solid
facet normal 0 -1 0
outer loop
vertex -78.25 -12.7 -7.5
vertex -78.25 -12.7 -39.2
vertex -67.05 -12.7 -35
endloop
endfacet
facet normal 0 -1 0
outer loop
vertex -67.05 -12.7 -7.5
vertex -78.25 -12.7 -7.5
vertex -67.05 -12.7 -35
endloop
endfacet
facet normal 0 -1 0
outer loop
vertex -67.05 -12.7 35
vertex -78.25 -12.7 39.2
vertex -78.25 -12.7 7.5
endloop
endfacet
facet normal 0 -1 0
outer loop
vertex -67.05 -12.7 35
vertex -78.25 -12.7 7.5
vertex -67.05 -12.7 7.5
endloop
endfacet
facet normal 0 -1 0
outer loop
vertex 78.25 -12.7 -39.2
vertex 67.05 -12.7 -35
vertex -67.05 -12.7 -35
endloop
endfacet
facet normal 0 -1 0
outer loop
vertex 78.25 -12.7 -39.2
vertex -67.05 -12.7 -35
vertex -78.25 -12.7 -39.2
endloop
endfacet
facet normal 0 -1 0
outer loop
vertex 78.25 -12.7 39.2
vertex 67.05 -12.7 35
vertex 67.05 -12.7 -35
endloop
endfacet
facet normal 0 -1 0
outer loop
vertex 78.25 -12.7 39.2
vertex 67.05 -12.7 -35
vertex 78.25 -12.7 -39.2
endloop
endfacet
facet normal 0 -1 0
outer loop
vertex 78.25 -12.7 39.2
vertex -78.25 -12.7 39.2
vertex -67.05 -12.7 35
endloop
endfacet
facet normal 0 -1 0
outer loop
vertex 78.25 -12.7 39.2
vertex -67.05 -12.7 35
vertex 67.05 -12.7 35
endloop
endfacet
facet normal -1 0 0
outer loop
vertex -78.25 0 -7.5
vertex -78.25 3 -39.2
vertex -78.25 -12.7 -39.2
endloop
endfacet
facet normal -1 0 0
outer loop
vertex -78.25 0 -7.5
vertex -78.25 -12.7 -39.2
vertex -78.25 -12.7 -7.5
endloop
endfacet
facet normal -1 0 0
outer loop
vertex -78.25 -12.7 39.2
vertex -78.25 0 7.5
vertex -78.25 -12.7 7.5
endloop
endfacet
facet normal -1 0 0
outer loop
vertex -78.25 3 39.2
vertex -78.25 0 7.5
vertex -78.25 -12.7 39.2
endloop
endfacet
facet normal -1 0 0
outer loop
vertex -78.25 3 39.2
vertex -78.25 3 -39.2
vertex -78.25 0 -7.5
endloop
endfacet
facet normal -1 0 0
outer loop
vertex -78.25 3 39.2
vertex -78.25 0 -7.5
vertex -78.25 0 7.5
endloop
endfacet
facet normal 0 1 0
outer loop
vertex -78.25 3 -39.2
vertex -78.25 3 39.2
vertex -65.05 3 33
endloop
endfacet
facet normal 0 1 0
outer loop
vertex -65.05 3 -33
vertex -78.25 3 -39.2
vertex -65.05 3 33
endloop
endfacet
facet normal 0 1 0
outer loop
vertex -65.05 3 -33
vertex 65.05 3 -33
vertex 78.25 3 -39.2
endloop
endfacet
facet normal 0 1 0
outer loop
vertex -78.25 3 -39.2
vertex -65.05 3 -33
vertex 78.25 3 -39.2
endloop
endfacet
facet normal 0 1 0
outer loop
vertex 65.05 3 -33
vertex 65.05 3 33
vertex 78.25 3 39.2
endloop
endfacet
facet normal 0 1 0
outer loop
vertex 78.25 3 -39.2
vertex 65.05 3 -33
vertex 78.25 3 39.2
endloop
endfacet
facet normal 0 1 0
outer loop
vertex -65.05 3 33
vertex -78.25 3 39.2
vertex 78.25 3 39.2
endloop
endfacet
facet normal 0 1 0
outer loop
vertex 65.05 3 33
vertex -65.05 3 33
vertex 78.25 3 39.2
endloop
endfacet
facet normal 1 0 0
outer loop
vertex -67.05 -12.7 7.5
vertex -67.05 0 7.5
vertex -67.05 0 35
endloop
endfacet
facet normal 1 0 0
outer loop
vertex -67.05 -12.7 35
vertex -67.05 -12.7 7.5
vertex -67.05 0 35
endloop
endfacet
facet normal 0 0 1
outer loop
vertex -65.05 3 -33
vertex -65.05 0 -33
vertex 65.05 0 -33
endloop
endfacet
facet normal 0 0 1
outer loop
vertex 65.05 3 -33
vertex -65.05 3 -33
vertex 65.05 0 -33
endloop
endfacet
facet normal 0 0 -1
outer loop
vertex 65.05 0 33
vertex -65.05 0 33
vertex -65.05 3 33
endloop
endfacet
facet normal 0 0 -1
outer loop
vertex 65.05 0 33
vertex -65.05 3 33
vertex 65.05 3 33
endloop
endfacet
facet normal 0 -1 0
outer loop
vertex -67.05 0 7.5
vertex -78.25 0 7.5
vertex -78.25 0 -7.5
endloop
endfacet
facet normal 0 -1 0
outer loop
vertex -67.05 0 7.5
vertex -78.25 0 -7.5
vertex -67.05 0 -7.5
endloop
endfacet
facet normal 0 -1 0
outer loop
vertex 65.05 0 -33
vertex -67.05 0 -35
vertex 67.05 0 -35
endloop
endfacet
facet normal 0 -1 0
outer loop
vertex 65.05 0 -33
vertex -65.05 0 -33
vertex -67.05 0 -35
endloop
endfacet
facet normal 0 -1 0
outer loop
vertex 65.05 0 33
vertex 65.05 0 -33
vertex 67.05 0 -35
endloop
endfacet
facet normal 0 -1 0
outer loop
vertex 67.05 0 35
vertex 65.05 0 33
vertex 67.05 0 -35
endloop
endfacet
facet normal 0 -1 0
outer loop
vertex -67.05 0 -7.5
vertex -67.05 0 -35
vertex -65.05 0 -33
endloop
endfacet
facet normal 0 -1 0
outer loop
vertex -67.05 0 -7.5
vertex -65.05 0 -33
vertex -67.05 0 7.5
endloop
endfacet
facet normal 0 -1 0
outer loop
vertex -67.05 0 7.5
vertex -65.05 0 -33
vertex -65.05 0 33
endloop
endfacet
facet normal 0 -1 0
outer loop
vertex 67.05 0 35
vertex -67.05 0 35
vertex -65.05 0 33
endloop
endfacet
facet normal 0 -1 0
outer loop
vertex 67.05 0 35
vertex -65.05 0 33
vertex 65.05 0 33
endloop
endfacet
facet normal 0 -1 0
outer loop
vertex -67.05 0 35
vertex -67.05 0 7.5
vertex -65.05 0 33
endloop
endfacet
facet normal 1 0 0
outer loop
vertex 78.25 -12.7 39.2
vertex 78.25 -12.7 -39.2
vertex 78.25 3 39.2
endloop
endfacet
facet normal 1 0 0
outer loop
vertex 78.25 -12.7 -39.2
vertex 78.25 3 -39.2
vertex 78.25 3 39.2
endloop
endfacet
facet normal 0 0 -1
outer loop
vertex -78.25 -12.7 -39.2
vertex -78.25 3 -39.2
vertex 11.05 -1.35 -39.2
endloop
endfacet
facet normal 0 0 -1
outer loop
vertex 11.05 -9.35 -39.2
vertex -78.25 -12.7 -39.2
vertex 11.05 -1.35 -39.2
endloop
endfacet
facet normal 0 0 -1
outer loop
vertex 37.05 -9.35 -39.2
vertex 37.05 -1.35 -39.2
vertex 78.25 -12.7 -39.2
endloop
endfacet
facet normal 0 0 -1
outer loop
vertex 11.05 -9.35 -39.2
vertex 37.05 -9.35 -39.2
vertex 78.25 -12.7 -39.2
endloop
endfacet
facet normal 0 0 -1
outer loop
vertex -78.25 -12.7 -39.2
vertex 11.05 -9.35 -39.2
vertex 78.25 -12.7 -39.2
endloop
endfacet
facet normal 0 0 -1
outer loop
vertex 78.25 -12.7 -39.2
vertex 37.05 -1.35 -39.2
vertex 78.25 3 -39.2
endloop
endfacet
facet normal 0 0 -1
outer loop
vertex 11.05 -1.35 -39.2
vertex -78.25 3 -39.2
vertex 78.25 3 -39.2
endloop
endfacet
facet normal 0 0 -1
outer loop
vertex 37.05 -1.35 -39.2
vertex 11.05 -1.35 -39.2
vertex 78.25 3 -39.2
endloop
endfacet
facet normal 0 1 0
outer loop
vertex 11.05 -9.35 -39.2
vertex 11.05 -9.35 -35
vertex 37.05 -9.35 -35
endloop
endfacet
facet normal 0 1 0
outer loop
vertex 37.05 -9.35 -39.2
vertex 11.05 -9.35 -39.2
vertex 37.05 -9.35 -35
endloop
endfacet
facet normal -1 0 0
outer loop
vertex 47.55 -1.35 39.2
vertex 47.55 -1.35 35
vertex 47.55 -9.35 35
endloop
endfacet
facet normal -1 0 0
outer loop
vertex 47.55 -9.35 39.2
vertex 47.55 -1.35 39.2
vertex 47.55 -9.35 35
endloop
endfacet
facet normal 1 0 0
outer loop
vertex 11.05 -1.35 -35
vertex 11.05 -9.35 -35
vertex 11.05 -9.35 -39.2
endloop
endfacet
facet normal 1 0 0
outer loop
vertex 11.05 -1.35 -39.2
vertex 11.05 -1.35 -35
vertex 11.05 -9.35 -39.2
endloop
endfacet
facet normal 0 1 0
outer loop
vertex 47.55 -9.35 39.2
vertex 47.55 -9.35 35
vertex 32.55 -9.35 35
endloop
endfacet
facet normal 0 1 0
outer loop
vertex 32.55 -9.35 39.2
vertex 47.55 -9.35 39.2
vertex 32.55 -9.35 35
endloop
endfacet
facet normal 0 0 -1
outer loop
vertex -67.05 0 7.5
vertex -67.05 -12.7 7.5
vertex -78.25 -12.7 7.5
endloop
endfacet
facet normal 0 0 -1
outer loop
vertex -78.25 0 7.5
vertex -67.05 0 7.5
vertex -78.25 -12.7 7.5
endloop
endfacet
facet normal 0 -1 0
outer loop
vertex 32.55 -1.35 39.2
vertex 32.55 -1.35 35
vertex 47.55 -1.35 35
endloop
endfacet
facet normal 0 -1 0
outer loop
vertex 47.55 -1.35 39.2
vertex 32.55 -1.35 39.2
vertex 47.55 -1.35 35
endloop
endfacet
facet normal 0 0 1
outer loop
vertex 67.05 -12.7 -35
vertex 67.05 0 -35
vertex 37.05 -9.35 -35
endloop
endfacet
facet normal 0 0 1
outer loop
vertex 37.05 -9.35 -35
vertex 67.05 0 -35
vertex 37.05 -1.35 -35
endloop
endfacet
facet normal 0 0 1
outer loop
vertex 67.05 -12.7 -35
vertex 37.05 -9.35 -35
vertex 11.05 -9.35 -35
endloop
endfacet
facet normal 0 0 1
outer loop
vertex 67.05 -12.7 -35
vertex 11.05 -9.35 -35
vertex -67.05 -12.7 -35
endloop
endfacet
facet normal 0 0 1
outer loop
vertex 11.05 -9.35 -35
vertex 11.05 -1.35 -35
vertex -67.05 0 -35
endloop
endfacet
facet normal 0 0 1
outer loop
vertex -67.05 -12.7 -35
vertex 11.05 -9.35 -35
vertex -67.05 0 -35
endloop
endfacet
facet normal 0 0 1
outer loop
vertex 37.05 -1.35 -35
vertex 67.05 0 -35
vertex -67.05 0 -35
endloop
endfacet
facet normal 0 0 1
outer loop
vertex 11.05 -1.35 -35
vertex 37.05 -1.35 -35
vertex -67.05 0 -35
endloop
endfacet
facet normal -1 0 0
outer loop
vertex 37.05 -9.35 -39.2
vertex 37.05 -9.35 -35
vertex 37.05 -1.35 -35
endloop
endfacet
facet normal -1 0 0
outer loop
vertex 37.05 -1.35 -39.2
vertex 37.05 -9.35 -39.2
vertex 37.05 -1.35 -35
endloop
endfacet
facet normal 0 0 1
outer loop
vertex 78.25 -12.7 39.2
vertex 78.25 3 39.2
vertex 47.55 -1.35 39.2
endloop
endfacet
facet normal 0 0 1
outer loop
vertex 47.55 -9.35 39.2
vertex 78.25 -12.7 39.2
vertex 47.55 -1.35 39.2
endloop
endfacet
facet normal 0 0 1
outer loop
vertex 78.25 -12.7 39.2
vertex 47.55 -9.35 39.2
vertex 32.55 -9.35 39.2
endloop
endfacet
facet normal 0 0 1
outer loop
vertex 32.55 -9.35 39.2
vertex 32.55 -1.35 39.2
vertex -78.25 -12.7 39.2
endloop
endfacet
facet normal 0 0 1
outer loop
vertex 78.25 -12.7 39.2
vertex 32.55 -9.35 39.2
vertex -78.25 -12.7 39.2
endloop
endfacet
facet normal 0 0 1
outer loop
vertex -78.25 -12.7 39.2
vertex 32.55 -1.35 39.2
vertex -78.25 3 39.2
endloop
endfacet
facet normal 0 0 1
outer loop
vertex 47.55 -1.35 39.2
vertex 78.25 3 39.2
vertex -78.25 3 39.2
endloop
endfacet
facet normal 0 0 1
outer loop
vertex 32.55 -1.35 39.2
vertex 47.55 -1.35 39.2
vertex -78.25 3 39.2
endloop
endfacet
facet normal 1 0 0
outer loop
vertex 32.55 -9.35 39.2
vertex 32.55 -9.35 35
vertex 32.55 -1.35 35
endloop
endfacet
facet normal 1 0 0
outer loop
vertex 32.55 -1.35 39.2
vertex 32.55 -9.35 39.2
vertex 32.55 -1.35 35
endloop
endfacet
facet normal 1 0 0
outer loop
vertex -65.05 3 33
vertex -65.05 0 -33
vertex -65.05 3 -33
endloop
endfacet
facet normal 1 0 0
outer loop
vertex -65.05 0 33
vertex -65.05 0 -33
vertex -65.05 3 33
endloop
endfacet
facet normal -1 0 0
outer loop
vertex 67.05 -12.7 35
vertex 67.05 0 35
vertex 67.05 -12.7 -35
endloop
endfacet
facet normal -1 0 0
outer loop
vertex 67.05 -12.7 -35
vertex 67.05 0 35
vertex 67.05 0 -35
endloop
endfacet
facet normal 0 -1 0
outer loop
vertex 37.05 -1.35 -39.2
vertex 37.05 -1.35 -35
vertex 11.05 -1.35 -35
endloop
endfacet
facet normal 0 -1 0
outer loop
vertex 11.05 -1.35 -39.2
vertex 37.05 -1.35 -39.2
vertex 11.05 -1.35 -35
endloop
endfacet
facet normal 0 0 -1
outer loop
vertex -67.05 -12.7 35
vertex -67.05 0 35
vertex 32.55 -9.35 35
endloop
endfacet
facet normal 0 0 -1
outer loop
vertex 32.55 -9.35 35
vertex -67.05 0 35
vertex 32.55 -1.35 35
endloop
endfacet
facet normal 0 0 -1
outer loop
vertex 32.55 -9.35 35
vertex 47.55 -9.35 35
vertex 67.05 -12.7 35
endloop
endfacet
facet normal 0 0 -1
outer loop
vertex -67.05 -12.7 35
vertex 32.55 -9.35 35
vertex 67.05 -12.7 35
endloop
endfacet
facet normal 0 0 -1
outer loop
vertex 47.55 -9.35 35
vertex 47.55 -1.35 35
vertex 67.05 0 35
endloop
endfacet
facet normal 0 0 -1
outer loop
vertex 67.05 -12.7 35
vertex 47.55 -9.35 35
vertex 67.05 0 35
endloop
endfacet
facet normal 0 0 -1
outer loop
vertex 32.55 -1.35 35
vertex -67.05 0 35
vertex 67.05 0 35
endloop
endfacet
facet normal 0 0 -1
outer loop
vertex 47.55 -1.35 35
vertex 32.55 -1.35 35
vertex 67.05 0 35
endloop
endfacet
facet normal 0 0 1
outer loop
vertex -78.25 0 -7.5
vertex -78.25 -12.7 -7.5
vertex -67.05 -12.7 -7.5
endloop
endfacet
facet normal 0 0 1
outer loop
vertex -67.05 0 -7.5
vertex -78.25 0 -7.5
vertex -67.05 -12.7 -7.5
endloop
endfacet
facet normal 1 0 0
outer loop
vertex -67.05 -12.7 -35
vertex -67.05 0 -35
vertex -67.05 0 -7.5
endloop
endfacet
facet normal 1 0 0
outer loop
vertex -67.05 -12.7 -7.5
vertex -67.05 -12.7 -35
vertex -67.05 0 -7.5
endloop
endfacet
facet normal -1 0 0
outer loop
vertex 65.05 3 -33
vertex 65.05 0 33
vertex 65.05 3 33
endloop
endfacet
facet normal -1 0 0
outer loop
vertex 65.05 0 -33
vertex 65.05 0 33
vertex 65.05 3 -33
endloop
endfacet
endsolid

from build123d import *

# Parameters (mm, degrees)
F0_W          = 130.1
F0_H          = 2
F1_DEPTH      = 3
F0_W_2        = 142.5
F0_H_2        = 78.4
F0_W_3        = 7
F2_DEPTH      = 3
F2_DEPTH_BACK = 12.7
F3_W          = 5.6
F3_H          = 7.5
F4_DEPTH      = 12.7
F6_DEPTH      = 4.201
F8_DEPTH      = 4.201
F9_DEPTH      = 2
F10_DEPTH     = 2


with BuildPart() as f1:
    # F0 (on Front) → F1 (new body)
    with BuildSketch(Plane.XZ):
        Polygon((67.05, 35), (65.05, 35), (65.05, 33), (65.05, -33), (65.05, -35), (67.05, -35), align=None)
        with Locations((0, 34)):
            Rectangle(F0_W, F0_H)
        Polygon((-65.05, 35), (-67.05, 35), (-67.05, -35), (-65.05, -35), (-65.05, -33), (-65.05, 33), align=None)
        with Locations((0, -34)):
            Rectangle(F0_W, F0_H)
    extrude(amount=-F1_DEPTH)

    # F0 (on Front) → F2 (join, two sides)
    with BuildSketch(Plane.XZ) as f2_sk:
        Rectangle(F0_W_2, F0_H_2)
        Polygon((-67.05, -35), (-67.05, 35), (-65.05, 35), (65.05, 35), (67.05, 35), (67.05, -35), (65.05, -35), (-65.05, -35), align=None, mode=Mode.SUBTRACT)
        with Locations((-74.75, 0)):
            Rectangle(F0_W_3, F0_H_2)
        with Locations((74.75, 0)):
            Rectangle(F0_W_3, F0_H_2)
    extrude(amount=-F2_DEPTH)
    extrude(f2_sk.sketch, amount=F2_DEPTH_BACK)

    # F3 (on face) → F4 (cut)
    with BuildSketch(Plane.XZ.offset(12.7)):
        with Locations((-75.45, 3.75)):
            Rectangle(F3_W, F3_H)
        with Locations((-69.85, 3.75)):
            Rectangle(F3_W, F3_H)
        with Locations((-69.85, -3.75)):
            Rectangle(F3_W, F3_H)
        with Locations((-75.45, -3.75)):
            Rectangle(F3_W, F3_H)
    extrude(amount=-F4_DEPTH, mode=Mode.SUBTRACT)

    # F5 (on face) → F6 (cut, through all)
    with BuildSketch(Plane(origin=(0, 0, 35), x_dir=(1, 0, 0), z_dir=(0, 0, -1))):
        Polygon((47.55, 3.35), (47.55, 6.35), (47.55, 9.35), (32.55, 9.35), (32.55, 3.35), align=None)
    extrude(amount=-F6_DEPTH, mode=Mode.SUBTRACT)

    # F7 (on face) → F8 (cut, through all)
    with BuildSketch(Plane.XY.offset(-35)):
        Polygon((37.05, -9.35), (37.05, -6.35), (37.05, -3.35), (11.05, -3.35), (11.05, -9.35), align=None)
    extrude(amount=-F8_DEPTH, mode=Mode.SUBTRACT)

    # F9 (cut): a face of the model
    f9_faces = [f1.faces().sort_by_distance(p)[0] for p in [
        (24.05, -3.35, -37.1),
    ]]
    extrude(f9_faces, amount=-F9_DEPTH, mode=Mode.SUBTRACT)

    # F10 (cut): a face of the model
    f10_faces = [f1.faces().sort_by_distance(p)[0] for p in [
        (40.05, -3.35, 37.1),
    ]]
    extrude(f10_faces, amount=-F10_DEPTH, mode=Mode.SUBTRACT)


solid = f1.part
